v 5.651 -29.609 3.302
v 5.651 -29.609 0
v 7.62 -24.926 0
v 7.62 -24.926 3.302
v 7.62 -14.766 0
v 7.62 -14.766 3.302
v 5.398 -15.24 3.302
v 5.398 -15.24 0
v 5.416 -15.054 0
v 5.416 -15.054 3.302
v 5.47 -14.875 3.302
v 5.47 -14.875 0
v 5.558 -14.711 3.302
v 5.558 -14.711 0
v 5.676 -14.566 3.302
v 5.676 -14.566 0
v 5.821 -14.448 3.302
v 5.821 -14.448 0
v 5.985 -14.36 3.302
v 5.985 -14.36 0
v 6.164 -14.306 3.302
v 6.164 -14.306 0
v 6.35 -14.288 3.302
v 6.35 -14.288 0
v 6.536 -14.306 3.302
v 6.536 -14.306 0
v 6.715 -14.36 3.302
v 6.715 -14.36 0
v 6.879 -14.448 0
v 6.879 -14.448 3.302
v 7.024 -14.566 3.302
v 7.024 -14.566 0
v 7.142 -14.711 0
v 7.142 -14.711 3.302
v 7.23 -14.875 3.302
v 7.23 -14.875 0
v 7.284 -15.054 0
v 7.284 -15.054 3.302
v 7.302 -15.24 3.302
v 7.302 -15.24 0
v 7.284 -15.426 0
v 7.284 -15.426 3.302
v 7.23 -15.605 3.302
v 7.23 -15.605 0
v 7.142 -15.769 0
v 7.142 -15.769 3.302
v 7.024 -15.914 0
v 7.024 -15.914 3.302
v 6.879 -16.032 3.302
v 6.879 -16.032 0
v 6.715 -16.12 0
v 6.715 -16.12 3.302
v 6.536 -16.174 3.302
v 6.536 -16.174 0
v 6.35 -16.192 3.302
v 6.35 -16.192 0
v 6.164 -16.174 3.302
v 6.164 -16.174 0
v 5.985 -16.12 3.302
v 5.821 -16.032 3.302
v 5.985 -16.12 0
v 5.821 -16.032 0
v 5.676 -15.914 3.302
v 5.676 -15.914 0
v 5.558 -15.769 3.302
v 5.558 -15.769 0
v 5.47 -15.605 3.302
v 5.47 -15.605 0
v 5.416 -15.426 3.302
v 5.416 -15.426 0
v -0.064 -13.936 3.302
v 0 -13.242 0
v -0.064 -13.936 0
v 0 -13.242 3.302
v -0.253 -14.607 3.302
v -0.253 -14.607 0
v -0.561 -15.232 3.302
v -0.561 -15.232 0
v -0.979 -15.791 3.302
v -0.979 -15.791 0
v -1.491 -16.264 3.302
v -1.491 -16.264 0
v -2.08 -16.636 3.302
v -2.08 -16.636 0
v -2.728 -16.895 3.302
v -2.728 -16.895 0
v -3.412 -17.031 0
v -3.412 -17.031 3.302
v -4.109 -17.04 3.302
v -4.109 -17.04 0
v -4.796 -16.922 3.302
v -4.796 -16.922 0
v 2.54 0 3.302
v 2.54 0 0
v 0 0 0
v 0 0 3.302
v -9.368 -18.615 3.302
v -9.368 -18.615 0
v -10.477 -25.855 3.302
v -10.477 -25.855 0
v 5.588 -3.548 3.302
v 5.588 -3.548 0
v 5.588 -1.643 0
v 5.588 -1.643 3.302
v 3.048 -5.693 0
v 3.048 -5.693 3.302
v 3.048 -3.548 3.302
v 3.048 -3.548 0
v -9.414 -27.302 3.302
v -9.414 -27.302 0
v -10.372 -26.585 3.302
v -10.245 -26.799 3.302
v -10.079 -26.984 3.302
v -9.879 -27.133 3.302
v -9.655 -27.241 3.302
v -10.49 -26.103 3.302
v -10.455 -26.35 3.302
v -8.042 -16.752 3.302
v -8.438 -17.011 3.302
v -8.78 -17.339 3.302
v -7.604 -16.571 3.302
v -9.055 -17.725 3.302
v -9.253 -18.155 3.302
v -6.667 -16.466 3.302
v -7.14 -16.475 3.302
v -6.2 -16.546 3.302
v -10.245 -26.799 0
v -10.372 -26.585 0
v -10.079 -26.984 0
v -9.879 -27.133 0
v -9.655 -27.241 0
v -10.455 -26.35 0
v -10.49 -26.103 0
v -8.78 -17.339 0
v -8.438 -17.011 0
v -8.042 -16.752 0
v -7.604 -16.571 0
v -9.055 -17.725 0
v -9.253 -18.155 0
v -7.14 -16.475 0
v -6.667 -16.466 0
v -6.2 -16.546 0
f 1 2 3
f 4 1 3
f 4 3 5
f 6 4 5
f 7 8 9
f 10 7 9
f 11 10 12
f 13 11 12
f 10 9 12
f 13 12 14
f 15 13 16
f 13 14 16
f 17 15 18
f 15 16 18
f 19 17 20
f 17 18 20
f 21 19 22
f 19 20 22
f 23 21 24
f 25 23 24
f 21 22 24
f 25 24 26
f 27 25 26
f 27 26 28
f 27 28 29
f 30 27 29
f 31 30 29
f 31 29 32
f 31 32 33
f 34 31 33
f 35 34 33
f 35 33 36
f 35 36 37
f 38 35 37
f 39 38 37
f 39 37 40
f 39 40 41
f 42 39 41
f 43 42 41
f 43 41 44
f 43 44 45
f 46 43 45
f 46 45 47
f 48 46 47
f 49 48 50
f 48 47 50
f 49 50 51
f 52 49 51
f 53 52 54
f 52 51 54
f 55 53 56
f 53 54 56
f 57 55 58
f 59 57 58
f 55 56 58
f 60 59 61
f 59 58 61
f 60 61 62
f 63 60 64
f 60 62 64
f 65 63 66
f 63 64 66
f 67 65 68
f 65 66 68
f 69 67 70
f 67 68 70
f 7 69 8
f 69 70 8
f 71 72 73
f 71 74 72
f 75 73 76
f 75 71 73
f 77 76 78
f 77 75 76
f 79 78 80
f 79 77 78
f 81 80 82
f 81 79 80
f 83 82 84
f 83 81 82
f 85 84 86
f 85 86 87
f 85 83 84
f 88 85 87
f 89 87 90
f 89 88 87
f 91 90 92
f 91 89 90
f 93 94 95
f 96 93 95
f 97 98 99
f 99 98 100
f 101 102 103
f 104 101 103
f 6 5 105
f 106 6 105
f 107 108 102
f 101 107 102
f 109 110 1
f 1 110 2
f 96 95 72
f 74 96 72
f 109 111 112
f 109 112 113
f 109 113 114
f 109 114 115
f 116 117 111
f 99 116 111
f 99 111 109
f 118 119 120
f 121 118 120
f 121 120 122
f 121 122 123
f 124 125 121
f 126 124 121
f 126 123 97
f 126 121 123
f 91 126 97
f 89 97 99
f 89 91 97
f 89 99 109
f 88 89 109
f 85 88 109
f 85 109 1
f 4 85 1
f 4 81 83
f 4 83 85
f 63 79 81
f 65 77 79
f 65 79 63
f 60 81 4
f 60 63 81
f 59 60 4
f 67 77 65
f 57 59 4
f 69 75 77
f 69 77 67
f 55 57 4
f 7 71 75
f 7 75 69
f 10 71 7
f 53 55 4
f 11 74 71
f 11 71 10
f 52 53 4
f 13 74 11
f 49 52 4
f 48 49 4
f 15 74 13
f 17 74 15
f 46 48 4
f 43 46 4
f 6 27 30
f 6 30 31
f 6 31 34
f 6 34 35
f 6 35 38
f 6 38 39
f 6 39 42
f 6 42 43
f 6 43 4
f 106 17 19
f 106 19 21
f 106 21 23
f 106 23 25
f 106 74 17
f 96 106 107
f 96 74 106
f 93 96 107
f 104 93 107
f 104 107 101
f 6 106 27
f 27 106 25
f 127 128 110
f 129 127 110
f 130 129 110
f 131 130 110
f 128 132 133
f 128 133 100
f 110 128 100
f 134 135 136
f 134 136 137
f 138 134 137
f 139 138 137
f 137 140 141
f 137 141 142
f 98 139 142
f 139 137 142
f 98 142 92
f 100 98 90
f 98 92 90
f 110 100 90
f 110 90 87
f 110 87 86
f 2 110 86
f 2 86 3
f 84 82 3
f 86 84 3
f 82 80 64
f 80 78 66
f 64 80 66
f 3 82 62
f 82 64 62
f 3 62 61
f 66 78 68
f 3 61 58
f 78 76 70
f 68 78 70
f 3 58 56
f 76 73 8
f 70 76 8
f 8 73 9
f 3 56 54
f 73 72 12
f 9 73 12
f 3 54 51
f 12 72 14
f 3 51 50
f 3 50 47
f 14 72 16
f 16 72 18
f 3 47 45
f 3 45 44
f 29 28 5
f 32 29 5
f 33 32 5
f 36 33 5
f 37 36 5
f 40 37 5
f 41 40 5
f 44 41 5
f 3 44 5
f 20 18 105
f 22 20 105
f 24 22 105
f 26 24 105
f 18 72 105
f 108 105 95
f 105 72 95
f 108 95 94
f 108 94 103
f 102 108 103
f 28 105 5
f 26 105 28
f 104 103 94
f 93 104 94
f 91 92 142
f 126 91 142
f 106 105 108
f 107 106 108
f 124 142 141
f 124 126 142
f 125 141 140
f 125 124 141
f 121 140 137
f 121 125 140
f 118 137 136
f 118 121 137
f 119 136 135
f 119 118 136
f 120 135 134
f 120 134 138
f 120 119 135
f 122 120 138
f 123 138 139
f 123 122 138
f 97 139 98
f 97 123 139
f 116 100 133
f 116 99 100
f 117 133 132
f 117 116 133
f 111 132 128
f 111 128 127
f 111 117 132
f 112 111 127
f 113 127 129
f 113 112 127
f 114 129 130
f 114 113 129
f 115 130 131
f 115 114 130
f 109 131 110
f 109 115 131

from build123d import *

# Parameters (mm, degrees)
F1_DEPTH = 3.302
F2_R     = 3.81
F3_R     = 2.54
F5_D     = 1.905
F6_R     = 1.27


with BuildPart() as f1:
    # F0 (on Top) → F1 (new body)
    with BuildSketch(Plane.XY):
        Polygon((2.54, 0), (0, 0), (0, -18.206947), (-8.938958, -15.811761), (-10.669027, -27.110069), (5.650751, -29.609057), (7.62, -24.926274), (7.62, -14.766274), (3.048, -5.693104), (3.048, -3.547886), (5.588, -3.547886), (5.588, -1.642886), align=None)
    extrude(amount=F1_DEPTH)

    # F2
    f2_edges = [f1.edges().sort_by_distance(p)[0] for p in [
        (0, -18.206947, 1.651),
    ]]
    fillet(f2_edges, radius=F2_R)

    # F3
    f3_edges = [f1.edges().sort_by_distance(p)[0] for p in [
        (-8.938958, -15.811761, 1.651),
    ]]
    fillet(f3_edges, radius=F3_R)

    # F5 (through all)
    with Locations(Plane.XY.offset(3.302)):
        with Locations((6.35, -15.24)):
            Hole(F5_D / 2)

    # F6
    f6_edges = [f1.edges().sort_by_distance(p)[0] for p in [
        (-10.669027, -27.110069, 1.651),
    ]]
    fillet(f6_edges, radius=F6_R)


solid = f1.part
